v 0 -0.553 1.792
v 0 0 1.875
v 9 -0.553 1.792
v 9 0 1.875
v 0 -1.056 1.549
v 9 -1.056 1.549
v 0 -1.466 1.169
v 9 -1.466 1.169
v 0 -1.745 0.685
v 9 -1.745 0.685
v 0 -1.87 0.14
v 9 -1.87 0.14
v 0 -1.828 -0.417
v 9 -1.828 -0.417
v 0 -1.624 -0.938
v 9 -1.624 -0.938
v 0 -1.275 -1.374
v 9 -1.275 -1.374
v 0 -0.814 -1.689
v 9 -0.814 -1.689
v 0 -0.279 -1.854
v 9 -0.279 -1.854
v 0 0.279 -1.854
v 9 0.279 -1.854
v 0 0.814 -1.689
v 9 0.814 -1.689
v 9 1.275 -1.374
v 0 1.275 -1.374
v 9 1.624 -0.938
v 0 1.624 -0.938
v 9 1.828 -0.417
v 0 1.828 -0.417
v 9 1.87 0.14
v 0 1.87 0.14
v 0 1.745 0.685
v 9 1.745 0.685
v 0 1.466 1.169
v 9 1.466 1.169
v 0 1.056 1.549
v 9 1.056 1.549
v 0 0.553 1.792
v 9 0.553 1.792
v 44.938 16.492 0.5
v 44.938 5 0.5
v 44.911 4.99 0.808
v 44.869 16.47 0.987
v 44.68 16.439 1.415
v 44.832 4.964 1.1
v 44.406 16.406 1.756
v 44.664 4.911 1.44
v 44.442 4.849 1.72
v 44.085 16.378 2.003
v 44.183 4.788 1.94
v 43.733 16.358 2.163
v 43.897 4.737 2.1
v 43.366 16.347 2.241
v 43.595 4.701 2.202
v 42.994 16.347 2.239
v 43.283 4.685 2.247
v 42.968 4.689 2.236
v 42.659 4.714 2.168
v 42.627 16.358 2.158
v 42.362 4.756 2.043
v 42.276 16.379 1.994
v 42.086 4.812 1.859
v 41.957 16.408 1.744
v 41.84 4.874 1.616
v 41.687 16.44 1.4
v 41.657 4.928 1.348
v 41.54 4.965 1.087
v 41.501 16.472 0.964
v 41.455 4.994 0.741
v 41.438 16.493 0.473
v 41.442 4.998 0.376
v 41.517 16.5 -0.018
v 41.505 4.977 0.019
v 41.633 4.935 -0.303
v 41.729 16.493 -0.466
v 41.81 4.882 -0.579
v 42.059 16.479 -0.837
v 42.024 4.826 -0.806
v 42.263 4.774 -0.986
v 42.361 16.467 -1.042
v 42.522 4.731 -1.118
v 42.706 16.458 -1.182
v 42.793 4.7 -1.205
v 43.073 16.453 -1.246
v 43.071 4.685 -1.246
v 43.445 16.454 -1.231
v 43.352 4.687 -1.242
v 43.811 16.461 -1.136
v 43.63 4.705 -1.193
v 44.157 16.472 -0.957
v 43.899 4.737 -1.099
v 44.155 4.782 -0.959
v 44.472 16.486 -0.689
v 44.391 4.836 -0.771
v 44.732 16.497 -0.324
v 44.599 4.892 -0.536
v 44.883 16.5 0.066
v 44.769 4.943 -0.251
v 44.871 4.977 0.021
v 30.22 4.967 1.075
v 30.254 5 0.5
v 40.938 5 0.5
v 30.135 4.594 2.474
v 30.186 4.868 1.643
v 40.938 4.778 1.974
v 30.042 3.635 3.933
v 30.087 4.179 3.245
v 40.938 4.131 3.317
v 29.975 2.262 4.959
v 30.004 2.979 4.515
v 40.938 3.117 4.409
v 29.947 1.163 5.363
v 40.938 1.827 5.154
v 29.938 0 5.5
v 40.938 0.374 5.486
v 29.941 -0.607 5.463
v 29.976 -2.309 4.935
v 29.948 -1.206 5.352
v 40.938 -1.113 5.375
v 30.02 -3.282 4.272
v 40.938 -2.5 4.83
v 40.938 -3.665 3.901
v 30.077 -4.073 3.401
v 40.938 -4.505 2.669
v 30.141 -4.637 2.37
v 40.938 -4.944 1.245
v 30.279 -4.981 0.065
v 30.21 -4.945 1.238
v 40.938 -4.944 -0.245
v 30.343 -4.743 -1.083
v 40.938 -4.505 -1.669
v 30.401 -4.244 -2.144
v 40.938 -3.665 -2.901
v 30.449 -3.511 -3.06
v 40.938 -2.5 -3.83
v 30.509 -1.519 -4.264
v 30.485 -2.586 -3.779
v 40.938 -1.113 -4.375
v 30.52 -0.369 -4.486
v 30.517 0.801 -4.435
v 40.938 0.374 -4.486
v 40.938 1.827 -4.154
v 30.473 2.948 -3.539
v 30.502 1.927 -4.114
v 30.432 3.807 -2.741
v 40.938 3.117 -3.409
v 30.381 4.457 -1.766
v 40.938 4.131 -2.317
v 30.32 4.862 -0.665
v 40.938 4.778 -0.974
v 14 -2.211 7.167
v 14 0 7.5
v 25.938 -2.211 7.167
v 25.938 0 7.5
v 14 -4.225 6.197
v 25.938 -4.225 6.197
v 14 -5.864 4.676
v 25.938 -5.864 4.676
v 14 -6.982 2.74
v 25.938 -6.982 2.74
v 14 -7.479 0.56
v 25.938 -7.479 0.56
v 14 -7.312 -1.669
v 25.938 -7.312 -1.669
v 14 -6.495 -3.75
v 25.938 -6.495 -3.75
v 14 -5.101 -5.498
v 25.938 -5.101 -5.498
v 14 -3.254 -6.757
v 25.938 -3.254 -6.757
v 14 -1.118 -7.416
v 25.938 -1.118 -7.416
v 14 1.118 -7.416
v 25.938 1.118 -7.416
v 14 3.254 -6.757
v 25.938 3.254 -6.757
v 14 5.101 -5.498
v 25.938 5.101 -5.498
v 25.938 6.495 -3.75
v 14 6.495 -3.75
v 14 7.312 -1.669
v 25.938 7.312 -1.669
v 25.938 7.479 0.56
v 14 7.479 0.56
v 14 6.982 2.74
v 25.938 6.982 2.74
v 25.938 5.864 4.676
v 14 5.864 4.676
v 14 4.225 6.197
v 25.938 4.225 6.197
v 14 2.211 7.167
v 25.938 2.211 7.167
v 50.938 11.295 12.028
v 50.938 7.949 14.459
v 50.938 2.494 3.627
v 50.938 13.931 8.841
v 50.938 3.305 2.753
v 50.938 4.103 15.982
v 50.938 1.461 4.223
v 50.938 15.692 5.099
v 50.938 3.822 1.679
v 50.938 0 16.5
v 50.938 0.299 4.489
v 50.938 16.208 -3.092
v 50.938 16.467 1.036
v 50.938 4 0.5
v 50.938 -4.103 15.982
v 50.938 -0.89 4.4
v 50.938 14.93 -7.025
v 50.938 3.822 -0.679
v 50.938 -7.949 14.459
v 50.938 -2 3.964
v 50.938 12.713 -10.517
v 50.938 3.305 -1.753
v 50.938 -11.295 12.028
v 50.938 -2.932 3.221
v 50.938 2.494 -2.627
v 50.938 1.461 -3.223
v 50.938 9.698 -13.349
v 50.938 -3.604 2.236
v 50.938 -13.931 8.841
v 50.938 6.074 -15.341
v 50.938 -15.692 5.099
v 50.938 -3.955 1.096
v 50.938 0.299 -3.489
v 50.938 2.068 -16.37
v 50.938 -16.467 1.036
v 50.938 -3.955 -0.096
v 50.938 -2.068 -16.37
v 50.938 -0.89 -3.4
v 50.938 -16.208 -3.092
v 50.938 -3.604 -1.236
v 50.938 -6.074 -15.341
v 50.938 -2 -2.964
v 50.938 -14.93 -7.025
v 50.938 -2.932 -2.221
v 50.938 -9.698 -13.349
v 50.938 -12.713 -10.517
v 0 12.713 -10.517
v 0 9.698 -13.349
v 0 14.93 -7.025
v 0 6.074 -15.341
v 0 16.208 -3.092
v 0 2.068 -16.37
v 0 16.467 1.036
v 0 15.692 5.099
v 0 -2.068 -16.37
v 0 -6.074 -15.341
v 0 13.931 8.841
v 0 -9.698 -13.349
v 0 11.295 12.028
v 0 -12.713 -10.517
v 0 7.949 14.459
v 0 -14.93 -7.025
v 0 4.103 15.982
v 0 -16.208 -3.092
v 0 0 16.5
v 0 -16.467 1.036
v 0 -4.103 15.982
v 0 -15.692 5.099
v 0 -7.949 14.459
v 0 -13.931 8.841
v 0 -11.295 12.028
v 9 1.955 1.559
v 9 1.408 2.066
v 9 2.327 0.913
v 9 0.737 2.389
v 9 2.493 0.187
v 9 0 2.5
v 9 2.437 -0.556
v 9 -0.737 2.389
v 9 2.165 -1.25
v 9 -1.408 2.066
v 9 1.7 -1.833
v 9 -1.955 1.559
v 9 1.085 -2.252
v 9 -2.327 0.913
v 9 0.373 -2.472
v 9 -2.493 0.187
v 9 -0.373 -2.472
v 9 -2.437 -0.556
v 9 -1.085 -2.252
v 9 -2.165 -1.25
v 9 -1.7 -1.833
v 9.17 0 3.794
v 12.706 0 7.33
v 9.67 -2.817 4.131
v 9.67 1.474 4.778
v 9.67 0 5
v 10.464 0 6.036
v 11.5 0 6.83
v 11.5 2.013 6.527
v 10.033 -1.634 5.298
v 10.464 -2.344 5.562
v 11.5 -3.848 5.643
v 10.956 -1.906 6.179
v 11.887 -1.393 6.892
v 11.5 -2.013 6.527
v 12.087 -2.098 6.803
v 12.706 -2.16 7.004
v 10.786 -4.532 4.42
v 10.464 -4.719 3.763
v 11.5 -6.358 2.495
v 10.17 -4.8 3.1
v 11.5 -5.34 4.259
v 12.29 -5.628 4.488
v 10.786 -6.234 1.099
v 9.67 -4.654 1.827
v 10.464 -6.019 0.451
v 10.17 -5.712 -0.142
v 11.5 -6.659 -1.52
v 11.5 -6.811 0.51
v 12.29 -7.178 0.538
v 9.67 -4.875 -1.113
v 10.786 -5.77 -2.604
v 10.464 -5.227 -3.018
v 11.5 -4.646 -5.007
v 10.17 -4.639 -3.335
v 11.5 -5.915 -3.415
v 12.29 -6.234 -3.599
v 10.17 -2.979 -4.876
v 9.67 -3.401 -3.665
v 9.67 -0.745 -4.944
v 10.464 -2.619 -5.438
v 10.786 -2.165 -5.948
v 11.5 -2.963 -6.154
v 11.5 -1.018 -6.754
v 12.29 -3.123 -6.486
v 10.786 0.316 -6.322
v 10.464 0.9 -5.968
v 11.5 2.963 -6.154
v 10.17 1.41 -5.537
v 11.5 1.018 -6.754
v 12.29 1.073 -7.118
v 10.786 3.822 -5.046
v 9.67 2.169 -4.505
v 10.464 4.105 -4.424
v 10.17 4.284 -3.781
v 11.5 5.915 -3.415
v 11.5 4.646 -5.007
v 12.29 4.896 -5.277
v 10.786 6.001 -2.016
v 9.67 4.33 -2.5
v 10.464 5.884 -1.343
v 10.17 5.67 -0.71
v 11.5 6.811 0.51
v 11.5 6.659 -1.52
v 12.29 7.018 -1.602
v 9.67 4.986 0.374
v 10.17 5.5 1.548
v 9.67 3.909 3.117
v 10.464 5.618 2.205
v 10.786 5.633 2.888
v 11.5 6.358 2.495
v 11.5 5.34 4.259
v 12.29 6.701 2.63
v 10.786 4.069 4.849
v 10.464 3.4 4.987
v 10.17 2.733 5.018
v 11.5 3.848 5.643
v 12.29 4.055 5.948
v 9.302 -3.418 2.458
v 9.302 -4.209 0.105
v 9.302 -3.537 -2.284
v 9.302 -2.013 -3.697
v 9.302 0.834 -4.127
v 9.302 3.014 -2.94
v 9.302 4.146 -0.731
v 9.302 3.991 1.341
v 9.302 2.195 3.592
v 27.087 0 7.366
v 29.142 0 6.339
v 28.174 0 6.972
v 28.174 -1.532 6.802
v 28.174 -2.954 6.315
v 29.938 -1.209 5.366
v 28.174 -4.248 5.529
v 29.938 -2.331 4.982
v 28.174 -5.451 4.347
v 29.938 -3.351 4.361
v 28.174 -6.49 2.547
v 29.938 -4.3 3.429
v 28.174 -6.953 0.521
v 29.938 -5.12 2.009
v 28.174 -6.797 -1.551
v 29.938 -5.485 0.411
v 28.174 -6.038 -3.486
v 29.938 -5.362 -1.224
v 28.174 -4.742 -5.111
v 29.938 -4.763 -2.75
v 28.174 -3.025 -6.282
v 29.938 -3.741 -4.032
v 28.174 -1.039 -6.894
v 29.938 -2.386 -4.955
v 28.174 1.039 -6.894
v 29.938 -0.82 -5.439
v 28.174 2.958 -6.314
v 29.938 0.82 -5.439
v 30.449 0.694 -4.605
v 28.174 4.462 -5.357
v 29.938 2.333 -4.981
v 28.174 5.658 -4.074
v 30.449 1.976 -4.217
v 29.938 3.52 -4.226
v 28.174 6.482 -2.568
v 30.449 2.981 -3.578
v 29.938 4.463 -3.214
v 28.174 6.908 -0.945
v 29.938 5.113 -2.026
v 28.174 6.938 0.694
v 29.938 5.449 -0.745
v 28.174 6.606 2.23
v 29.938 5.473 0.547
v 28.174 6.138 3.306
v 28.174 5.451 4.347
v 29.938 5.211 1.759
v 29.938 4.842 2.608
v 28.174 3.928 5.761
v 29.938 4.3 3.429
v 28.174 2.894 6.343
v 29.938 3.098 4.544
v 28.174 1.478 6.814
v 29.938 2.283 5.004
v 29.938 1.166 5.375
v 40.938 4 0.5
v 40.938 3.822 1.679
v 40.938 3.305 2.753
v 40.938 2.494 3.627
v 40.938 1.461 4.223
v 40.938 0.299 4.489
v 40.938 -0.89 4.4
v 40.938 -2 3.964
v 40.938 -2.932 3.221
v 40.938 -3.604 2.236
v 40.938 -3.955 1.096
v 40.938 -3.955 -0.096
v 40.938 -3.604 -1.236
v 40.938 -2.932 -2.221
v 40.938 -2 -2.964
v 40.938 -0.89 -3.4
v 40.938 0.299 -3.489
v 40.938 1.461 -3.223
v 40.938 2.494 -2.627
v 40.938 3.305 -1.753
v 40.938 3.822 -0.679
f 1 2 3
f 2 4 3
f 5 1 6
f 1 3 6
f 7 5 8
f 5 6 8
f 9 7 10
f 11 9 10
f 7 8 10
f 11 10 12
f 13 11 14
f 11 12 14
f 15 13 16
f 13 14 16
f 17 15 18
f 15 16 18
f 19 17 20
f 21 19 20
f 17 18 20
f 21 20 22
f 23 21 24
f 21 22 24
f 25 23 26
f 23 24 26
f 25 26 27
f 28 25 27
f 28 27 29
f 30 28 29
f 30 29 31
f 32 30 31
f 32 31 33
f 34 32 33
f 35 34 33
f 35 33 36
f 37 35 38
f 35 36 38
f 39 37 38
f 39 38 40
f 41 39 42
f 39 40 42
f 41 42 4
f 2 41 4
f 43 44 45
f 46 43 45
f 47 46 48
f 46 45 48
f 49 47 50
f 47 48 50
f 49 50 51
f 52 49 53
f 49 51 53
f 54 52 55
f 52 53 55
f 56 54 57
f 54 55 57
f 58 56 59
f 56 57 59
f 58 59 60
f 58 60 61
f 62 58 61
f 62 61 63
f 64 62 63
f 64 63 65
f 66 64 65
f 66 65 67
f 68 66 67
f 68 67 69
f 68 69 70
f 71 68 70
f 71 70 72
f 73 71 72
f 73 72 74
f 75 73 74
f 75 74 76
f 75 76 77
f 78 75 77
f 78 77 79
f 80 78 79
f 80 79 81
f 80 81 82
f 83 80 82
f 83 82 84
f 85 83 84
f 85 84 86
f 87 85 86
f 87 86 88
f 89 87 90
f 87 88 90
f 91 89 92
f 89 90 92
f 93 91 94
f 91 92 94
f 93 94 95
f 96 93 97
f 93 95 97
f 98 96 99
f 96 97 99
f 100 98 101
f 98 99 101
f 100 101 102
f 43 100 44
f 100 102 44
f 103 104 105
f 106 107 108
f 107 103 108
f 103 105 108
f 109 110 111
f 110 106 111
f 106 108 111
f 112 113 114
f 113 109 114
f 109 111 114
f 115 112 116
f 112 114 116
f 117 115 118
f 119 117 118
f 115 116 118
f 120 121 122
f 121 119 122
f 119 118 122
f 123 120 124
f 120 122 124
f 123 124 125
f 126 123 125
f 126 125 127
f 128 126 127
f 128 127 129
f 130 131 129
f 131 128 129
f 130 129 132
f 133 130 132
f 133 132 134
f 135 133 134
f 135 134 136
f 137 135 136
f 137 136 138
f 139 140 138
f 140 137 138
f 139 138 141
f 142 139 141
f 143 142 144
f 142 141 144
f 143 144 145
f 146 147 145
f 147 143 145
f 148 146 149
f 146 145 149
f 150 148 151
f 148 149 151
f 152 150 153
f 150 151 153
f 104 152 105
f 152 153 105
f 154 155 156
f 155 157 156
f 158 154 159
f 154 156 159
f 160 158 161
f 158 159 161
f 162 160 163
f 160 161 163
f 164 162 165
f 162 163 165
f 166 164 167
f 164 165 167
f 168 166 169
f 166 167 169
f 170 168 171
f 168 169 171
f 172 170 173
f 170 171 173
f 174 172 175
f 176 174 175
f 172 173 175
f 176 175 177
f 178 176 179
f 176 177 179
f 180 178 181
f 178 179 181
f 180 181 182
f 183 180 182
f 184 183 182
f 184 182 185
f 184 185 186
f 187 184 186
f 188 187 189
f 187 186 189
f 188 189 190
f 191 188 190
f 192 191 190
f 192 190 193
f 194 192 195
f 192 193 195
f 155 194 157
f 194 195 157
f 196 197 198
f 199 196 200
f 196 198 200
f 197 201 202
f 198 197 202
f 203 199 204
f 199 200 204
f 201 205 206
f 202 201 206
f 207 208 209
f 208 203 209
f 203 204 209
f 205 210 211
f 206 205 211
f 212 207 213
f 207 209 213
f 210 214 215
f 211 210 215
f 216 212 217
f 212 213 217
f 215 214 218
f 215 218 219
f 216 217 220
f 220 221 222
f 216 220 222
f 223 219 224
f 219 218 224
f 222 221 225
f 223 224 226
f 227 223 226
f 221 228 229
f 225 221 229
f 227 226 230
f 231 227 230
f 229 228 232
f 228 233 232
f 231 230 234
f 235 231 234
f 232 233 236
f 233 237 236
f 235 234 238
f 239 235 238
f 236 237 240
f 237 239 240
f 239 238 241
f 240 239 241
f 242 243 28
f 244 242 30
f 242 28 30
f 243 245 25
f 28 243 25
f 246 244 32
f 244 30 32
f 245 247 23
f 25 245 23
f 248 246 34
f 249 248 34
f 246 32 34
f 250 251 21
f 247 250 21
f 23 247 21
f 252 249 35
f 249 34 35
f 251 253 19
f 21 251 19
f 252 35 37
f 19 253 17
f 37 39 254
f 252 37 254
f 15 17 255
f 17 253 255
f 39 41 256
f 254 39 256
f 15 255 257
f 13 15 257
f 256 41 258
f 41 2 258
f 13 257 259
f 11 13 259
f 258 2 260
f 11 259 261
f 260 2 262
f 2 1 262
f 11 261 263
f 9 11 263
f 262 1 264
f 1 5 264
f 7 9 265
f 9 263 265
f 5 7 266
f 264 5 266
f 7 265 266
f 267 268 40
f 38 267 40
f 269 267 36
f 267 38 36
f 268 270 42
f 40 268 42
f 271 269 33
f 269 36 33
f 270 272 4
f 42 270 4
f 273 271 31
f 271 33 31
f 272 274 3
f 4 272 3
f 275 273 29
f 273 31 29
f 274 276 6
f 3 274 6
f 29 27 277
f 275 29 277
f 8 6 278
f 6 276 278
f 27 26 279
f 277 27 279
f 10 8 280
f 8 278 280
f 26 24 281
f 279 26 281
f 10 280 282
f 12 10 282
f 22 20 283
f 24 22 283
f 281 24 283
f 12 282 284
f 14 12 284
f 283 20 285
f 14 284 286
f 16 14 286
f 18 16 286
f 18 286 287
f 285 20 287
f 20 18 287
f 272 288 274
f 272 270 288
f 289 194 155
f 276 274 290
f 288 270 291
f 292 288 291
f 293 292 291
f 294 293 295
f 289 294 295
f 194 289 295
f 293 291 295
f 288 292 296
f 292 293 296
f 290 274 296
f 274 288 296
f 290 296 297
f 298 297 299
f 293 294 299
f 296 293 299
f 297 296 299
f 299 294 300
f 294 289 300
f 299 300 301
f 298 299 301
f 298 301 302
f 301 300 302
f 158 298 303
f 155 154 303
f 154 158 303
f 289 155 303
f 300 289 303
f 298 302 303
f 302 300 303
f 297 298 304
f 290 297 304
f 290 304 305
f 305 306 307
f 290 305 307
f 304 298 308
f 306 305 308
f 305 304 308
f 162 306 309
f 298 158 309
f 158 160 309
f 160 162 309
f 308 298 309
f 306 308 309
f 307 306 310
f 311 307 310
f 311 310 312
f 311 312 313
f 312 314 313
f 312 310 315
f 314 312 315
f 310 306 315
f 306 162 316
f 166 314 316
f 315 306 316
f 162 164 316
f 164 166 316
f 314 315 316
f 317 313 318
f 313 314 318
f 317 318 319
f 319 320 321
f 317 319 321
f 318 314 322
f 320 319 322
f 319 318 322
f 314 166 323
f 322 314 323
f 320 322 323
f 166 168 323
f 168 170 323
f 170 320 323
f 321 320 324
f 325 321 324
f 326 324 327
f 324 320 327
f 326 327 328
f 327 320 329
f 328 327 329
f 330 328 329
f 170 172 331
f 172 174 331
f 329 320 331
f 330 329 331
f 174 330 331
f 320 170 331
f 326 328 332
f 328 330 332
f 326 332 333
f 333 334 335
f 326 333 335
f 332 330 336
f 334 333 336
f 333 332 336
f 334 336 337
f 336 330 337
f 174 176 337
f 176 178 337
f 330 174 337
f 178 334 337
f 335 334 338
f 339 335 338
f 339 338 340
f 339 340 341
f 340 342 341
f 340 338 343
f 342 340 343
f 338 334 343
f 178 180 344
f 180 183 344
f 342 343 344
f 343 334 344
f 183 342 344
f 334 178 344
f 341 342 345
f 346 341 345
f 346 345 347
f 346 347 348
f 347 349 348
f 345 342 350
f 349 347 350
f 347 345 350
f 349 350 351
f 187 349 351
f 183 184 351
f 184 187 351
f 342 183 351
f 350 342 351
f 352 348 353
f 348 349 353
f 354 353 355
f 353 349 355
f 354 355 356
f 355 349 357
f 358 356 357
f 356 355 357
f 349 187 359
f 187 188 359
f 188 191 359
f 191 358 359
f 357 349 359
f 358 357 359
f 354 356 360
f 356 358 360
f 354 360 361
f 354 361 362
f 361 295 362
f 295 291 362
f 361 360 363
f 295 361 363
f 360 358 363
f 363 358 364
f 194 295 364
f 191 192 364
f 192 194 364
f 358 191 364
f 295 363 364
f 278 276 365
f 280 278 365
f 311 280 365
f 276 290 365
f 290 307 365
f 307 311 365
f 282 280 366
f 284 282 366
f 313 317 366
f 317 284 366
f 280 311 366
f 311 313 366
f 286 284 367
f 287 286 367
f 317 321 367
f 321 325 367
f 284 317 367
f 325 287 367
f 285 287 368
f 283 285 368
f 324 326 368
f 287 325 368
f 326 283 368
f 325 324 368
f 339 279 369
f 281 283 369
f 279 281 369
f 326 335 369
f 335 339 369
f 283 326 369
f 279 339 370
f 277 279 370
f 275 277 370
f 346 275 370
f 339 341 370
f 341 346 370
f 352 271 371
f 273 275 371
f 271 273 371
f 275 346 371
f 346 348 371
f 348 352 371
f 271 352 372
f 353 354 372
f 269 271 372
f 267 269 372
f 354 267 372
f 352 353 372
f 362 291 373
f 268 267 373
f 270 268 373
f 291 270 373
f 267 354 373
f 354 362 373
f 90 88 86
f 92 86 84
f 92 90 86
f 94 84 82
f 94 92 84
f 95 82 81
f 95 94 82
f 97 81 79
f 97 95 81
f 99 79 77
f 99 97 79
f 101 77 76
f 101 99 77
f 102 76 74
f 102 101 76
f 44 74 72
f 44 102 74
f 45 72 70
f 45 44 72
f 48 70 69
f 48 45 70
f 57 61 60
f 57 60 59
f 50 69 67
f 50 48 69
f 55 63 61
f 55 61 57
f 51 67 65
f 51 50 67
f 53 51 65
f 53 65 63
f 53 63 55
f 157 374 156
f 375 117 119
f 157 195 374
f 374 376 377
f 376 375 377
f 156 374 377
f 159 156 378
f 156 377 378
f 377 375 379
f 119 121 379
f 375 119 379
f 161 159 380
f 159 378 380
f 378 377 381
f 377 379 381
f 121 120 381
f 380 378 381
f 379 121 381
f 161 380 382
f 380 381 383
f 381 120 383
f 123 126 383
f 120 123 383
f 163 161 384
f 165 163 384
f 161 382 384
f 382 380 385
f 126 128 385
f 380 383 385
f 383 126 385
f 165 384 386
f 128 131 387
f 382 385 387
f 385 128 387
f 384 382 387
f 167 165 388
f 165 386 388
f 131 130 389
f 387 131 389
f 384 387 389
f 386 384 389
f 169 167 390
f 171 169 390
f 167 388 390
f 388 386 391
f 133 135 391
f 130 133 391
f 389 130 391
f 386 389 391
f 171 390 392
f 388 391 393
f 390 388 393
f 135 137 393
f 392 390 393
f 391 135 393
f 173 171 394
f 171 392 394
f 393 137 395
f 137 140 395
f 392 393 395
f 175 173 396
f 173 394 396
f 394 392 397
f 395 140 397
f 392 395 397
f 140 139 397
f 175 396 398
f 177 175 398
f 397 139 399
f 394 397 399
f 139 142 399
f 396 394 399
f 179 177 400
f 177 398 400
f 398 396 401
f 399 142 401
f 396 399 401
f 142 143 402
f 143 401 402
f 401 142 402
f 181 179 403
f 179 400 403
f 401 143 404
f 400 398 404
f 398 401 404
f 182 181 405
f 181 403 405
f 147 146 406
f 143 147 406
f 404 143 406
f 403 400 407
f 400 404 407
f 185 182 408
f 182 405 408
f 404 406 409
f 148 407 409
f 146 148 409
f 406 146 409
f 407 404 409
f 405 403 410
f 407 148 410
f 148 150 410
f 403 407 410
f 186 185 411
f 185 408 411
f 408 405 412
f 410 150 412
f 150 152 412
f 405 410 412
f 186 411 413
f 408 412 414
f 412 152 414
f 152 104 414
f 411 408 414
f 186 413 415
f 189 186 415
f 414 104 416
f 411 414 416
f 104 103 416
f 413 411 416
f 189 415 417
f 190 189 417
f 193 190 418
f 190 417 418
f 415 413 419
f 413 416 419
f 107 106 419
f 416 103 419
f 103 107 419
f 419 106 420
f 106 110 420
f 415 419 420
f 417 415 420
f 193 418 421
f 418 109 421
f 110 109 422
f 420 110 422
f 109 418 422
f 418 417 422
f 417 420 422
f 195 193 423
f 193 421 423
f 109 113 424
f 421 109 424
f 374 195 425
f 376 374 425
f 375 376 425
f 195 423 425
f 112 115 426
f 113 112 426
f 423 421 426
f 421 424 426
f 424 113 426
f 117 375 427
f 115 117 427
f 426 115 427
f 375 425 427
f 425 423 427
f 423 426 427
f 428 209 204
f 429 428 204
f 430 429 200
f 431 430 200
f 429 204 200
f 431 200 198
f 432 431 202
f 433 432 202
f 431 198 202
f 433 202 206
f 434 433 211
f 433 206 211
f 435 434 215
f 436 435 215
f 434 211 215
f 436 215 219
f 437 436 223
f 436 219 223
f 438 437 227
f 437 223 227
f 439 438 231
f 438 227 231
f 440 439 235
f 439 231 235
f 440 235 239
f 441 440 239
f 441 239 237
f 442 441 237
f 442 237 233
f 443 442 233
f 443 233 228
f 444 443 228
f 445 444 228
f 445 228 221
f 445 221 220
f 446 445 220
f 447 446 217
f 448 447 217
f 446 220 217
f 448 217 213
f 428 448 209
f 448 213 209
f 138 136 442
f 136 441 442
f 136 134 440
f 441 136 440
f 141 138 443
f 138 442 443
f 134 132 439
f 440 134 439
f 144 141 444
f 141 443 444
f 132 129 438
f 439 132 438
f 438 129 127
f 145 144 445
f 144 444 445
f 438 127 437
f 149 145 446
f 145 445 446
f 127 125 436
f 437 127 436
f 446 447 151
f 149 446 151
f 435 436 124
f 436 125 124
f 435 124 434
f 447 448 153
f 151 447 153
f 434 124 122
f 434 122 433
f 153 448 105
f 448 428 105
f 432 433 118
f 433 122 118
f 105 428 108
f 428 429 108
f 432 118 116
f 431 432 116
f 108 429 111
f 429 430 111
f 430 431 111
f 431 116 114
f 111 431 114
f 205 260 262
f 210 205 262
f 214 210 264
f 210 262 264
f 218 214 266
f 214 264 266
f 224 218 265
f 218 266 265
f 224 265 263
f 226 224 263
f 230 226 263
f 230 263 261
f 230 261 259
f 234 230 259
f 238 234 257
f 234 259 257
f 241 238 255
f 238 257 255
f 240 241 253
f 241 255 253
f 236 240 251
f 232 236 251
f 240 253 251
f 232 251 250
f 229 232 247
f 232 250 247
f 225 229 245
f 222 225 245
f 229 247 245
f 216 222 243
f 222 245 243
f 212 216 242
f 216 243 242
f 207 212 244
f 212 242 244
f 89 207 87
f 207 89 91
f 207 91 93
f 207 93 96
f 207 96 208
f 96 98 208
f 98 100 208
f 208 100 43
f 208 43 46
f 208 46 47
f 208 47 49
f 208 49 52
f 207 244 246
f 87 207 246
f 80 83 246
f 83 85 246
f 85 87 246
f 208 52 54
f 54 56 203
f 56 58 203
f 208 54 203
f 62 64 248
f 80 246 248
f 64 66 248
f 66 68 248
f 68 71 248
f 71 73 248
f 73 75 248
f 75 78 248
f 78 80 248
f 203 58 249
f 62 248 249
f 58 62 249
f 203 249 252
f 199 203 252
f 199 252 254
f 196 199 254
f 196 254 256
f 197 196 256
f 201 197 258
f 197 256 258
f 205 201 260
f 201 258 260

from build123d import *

# Parameters (mm, degrees)
F2_R     = 4
F3_DEPTH = 20.418424405
F4_R     = 1.75
F5_DEPTH = 25
F2_R_2   = 5
F6_DEPTH = 25
F7_DEPTH = 10


with BuildPart() as f1:
    # F0 (on Front) → F1 (revolve)
    with BuildSketch(Plane.XZ):
        with BuildLine():
            Line((30.9380175069, 2.5), (30.9380175069, 0))
            Line((30.9380175069, 0), (32.0326841507, 0))
            Line((32.0326841507, 0), (50.9380175069, 0))
            Line((50.9380175069, 0), (50.9380175069, 16.5))
            Line((50.9380175069, 16.5), (30.9380175069, 16.5))
            Line((30.9380175069, 16.5), (9, 16.5))
            Line((9, 16.5), (0, 16.5))
            Line((0, 16.5), (0, 1.875))
            Line((0, 1.875), (9, 1.875))
            Line((9, 1.875), (9, 2.5))
            ThreePointArc((9, 2.5), (10.4644660941, 6.0355339059), (14, 7.5))
            Line((14, 7.5), (25.9380175069, 7.5))
            ThreePointArc((25.9380175069, 7.5), (29.4735514129, 6.0355339059), (30.9380175069, 2.5))
        make_face()
    revolve(axis=Axis((16.0163420754, 0, 0), (1, 0, 0)))

    # F2 (on face) → F3 (cut, through all)
    with BuildSketch(Plane.YZ.offset(50.9380175069)):
        with Locations((0, 0.5)):
            Circle(F2_R)
    extrude(amount=-F3_DEPTH, mode=Mode.SUBTRACT)

    # F4 (on Front) → F5 (cut)
    with BuildSketch(Plane.XZ):
        with Locations((43.1880175069, 0.5)):
            Circle(F4_R)
    extrude(amount=-F5_DEPTH, mode=Mode.SUBTRACT)

    # F2 (on face) → F6 (cut)
    with BuildSketch(Plane.YZ.offset(50.9380175069)):
        with Locations((0, 0.5)):
            Circle(F2_R_2)
        with Locations((0, 0.5)):
            Circle(F2_R, mode=Mode.SUBTRACT)
    extrude(amount=-F6_DEPTH, mode=Mode.SUBTRACT)

    # F2 (on face) → F7 (join)
    with BuildSketch(Plane.YZ.offset(50.9380175069)):
        with Locations((0, 0.5)):
            Circle(F2_R_2)
        with Locations((0, 0.5)):
            Circle(F2_R, mode=Mode.SUBTRACT)
    extrude(amount=-F7_DEPTH)


solid = f1.part
